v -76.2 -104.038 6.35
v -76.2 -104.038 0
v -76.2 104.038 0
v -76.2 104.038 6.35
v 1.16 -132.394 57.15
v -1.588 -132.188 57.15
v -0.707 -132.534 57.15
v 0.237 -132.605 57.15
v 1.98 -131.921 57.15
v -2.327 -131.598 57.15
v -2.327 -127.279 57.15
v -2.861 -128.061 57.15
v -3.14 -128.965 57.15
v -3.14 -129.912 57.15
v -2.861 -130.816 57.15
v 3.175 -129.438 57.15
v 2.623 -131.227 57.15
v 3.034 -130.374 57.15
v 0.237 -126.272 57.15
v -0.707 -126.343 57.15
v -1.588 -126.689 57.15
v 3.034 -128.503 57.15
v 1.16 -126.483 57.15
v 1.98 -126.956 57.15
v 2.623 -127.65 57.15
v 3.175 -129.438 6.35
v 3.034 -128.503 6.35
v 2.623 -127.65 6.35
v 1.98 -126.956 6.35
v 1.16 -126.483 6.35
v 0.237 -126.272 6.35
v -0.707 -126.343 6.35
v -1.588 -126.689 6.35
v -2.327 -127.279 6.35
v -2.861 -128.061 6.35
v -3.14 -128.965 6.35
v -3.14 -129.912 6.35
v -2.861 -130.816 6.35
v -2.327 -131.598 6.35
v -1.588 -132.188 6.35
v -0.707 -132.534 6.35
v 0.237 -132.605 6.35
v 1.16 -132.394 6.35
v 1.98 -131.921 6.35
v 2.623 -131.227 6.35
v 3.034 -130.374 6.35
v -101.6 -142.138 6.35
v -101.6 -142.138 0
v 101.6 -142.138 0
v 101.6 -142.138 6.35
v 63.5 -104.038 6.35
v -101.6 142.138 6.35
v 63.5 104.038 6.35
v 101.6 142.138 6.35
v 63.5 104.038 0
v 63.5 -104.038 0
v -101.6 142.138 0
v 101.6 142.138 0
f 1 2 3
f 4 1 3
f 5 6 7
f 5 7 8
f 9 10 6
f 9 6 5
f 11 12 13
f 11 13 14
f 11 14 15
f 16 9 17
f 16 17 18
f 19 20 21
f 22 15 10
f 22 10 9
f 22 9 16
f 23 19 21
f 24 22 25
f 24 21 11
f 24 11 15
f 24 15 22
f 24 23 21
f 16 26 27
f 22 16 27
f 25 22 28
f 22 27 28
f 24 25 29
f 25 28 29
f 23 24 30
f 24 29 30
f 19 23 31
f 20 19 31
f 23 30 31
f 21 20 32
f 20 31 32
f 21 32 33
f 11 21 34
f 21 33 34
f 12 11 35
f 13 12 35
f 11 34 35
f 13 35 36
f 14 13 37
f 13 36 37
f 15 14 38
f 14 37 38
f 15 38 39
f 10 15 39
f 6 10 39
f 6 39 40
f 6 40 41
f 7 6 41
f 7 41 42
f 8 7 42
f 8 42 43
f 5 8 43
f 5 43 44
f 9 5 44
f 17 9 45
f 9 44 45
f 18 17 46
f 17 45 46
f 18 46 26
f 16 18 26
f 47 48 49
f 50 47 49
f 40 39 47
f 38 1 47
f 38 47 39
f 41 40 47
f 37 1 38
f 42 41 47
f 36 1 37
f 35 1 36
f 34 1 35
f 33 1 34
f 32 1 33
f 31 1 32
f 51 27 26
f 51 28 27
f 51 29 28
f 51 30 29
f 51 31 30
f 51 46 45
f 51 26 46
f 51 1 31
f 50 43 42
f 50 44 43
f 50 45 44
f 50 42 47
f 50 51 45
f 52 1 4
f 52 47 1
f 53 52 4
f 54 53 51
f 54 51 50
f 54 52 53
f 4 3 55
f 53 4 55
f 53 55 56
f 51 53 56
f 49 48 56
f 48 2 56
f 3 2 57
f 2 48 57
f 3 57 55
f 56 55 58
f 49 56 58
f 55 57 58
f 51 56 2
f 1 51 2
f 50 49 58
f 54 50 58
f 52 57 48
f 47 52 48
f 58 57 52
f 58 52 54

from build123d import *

# Parameters (mm, degrees)
F0_W     = 203.2
F0_H     = 25.4
F0_H_2   = 233.4768
F0_W_2   = 12.7
F0_H_3   = 182.6768
F0_H_4   = 12.7
F1_DEPTH = 6.35
F2_R     = 3.175
F3_DEPTH = 50.8


with BuildPart() as f1:
    # F0 (on Top) → F1 (new body)
    with BuildSketch(Plane.XY):
        with Locations((0, 129.4384)):
            Rectangle(F0_W, F0_H)
        with Locations((0, -129.4384)):
            Rectangle(F0_W, F0_H)
        Rectangle(F0_W, F0_H_2)
        Polygon((76.2, 91.3384), (76.2, -91.3384), (76.2, -104.0384), (63.5, -104.0384), (-63.5, -104.0384), (-76.2, -104.0384), (-76.2, -91.3384), (-76.2, 91.3384), (-76.2, 104.0384), (-63.5, 104.0384), (63.5, 104.0384), (76.2, 104.0384), align=None, mode=Mode.SUBTRACT)
        with Locations((69.85, 0)):
            Rectangle(F0_W_2, F0_H_3)
        with Locations((69.85, -97.6884)):
            Rectangle(F0_W_2, F0_H_4)
        with Locations((69.85, 97.6884)):
            Rectangle(F0_W_2, F0_H_4)
    extrude(amount=F1_DEPTH)

    # F2 (on face) → F3 (join)
    with BuildSketch(Plane.XY.offset(6.35)):
        with Locations((0, -129.4384)):
            Circle(F2_R)
    extrude(amount=F3_DEPTH)


solid = f1.part
